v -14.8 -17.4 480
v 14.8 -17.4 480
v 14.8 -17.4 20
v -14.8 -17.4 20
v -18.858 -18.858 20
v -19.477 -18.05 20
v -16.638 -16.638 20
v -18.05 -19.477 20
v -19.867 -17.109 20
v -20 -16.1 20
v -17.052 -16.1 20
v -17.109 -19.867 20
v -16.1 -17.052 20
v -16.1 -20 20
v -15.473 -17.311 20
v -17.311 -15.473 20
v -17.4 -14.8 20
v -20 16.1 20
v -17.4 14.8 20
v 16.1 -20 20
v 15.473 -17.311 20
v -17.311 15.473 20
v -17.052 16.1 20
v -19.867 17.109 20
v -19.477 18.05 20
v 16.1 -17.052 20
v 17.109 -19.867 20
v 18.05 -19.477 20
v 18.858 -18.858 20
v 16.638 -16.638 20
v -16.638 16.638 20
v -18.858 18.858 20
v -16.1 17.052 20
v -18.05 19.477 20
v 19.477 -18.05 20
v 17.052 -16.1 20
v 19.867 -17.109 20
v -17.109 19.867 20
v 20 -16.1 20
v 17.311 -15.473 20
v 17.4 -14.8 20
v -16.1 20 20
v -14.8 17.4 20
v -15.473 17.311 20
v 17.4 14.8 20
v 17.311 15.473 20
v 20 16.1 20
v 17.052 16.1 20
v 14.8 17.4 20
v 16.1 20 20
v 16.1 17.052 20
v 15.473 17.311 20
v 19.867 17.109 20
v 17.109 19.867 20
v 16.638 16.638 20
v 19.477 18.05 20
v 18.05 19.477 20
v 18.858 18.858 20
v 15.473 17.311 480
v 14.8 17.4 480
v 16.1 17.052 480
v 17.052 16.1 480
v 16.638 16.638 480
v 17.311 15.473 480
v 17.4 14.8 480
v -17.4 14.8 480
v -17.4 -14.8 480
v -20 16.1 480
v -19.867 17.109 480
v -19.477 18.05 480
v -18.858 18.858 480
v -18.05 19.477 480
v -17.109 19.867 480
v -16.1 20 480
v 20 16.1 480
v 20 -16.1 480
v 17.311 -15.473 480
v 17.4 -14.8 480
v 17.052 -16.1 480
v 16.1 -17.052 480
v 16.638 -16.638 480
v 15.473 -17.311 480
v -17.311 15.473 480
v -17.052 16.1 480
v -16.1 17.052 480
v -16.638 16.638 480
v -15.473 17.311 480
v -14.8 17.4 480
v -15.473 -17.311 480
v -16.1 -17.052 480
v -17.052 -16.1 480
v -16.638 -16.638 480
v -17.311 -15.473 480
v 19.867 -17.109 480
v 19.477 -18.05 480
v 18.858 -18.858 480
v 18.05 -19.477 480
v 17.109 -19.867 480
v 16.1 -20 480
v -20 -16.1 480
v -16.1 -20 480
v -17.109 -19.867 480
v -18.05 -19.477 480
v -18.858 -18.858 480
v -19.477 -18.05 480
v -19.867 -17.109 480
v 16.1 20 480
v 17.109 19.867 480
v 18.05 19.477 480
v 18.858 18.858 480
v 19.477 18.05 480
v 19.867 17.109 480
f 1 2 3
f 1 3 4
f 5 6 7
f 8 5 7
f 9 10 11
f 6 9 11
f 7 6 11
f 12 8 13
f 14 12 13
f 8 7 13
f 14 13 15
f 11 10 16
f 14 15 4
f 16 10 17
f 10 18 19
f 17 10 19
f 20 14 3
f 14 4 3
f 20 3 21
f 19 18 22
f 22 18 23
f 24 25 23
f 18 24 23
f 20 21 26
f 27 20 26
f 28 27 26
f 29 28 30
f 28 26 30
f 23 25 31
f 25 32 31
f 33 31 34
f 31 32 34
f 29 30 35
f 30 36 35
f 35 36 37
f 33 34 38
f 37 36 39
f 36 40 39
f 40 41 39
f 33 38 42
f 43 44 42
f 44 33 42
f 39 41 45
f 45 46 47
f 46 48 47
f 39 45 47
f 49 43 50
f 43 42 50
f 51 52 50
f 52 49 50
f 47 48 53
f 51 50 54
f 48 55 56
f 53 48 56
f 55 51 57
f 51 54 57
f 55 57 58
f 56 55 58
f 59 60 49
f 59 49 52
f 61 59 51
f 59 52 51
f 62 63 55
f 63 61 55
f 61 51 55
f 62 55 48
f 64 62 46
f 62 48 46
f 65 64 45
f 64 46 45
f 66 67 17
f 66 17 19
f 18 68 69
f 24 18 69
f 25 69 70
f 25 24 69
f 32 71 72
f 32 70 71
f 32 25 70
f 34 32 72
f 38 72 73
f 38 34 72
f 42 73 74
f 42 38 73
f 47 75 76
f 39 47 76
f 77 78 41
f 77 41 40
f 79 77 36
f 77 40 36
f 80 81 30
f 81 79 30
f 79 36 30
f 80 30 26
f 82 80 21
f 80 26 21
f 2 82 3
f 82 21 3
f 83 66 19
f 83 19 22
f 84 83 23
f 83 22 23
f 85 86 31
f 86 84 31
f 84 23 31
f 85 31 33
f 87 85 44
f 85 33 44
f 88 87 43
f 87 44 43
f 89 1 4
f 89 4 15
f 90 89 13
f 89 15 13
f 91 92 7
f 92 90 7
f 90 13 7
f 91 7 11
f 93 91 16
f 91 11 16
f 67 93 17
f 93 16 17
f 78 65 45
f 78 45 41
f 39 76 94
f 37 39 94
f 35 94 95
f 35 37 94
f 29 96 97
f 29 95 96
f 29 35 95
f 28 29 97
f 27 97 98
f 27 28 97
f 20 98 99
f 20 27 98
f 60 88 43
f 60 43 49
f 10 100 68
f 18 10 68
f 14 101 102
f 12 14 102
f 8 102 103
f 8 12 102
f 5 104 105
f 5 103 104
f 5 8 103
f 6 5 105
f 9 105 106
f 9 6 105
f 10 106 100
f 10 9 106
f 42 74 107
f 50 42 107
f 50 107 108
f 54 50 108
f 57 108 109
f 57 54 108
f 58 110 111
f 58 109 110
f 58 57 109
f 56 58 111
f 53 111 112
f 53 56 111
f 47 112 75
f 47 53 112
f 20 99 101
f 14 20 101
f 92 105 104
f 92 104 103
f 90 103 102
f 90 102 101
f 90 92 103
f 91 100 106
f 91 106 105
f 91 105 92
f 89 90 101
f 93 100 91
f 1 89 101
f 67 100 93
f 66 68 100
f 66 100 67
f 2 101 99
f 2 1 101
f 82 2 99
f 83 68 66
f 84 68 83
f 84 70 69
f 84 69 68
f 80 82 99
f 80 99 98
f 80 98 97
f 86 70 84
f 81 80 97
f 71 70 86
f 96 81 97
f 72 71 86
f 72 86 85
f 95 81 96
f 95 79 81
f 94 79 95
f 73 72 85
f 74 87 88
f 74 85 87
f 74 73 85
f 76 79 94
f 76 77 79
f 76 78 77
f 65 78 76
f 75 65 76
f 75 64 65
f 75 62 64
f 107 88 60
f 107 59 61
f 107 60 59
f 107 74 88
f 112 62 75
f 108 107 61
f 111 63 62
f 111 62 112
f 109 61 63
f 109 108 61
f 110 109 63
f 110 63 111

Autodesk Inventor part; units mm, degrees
ref_plane "Start plane" through (0, 0, 20) normal (0, 0, 1) x (1, 0, 0)
ref_plane "End plane" through (0, 0, 480) normal (0, 0, 1) x (1, 0, 0)
sketch "Sketch" plane through (0, 0, 0) normal (0, 0, 1) x (1, 0, 0)
  line L0 (-20, -16.1) -> (-20, 16.1)
  line L1 (-16.1, 20) -> (16.1, 20)
  line L2 (20, 16.1) -> (20, -16.1)
  line L3 (16.1, -20) -> (-16.1, -20)
  arc A0 (-20, -16.1) -> (-16.1, -20) centre (-16.1, -16.1) ccw
  arc A1 (-16.1, 20) -> (-20, 16.1) centre (-16.1, 16.1) ccw
  arc A2 (20, 16.1) -> (16.1, 20) centre (16.1, 16.1) ccw
  arc A3 (16.1, -20) -> (20, -16.1) centre (16.1, -16.1) ccw
  line L4 (-14.8, 17.4) -> (14.8, 17.4)
  line L5 (17.4, 14.8) -> (17.4, -14.8)
  line L6 (14.8, -17.4) -> (-14.8, -17.4)
  line L7 (-17.4, -14.8) -> (-17.4, 14.8)
  line L8 (0, 29.1308) -> (0, -29.1308) construction
  line L9 (-29.1308, 0) -> (29.1308, 0) construction
  arc A4 (-17.4, -14.8) -> (-14.8, -17.4) centre (-14.8, -14.8) ccw
  arc A5 (-14.8, 17.4) -> (-17.4, 14.8) centre (-14.8, 14.8) ccw
  arc A6 (17.4, 14.8) -> (14.8, 17.4) centre (14.8, 14.8) ccw
  arc A7 (14.8, -17.4) -> (17.4, -14.8) centre (14.8, -14.8) ccw
  dimension "d7" = 3.9
  dimension "d10" = 40
  dimension "d11" = 40
  dimension "d12" = 2.6
  dimension "d15" = 20
  dimension "d16" = 20
  dimension "d19" = 2.6
  dimension "d20" = 2.6
extrude "Body" add sketch "Sketch" along normal up to surface (460 mm away) from surface at 20
sketch "Sketch3" plane through (0, 0, 0) normal (0, 0, 1) x (1, 0, 0)
  line L0 (0, 0) -> (10, 0)
ref_plane "Work Plane3" through (0, 0, 0) normal (0, -1, 0) x (1, 0, 0)
sketch "Sketch4" plane through (0, 0, 0) normal (0, -1, 0) x (1, 0, 0)
  line L0 (-2, 20) -> (12, 20)
  line L1 (-2, 480) -> (12, 480)
  dimension "d18" = 460
ref_plane "Work Plane4" through (700, -16.1, 480) normal (0, 0, 1) x (1, 0, 0)
split "Split1" plane through (700, -16.1, 480) removes the side toward (0, 0, 1)
ref_plane "Work Plane5" through (-800, -16.1, 20) normal (0, 0, -1) x (-1, 0, 0)
split "Split2" plane through (-800, -16.1, 20) removes the side toward (0, 0, -1)
equation "\"d7\" = G_IR"
equation "\"d10\" = G_H"
equation "\"d11\" = G_W"
equation "\"d12\" = G_T"
equation "\"d15\" = 0.5 * d10"
equation "\"d16\" = 0.5 * d11"
equation "\"d19\" = G_T"
equation "\"d20\" = G_T"
equation "\"d3\" = G_L"
equation "\"G_W\" = 40"
equation "\"G_H\" = 40"
equation "\"G_T\" = 2.6"
equation "\"G_IR\" = 3.9"
equation "\"G_L\" = d18"
properties part number "EN 10210-2 - 40 x 40 x 2.6 - 460" material "Steel, Galvanized"
